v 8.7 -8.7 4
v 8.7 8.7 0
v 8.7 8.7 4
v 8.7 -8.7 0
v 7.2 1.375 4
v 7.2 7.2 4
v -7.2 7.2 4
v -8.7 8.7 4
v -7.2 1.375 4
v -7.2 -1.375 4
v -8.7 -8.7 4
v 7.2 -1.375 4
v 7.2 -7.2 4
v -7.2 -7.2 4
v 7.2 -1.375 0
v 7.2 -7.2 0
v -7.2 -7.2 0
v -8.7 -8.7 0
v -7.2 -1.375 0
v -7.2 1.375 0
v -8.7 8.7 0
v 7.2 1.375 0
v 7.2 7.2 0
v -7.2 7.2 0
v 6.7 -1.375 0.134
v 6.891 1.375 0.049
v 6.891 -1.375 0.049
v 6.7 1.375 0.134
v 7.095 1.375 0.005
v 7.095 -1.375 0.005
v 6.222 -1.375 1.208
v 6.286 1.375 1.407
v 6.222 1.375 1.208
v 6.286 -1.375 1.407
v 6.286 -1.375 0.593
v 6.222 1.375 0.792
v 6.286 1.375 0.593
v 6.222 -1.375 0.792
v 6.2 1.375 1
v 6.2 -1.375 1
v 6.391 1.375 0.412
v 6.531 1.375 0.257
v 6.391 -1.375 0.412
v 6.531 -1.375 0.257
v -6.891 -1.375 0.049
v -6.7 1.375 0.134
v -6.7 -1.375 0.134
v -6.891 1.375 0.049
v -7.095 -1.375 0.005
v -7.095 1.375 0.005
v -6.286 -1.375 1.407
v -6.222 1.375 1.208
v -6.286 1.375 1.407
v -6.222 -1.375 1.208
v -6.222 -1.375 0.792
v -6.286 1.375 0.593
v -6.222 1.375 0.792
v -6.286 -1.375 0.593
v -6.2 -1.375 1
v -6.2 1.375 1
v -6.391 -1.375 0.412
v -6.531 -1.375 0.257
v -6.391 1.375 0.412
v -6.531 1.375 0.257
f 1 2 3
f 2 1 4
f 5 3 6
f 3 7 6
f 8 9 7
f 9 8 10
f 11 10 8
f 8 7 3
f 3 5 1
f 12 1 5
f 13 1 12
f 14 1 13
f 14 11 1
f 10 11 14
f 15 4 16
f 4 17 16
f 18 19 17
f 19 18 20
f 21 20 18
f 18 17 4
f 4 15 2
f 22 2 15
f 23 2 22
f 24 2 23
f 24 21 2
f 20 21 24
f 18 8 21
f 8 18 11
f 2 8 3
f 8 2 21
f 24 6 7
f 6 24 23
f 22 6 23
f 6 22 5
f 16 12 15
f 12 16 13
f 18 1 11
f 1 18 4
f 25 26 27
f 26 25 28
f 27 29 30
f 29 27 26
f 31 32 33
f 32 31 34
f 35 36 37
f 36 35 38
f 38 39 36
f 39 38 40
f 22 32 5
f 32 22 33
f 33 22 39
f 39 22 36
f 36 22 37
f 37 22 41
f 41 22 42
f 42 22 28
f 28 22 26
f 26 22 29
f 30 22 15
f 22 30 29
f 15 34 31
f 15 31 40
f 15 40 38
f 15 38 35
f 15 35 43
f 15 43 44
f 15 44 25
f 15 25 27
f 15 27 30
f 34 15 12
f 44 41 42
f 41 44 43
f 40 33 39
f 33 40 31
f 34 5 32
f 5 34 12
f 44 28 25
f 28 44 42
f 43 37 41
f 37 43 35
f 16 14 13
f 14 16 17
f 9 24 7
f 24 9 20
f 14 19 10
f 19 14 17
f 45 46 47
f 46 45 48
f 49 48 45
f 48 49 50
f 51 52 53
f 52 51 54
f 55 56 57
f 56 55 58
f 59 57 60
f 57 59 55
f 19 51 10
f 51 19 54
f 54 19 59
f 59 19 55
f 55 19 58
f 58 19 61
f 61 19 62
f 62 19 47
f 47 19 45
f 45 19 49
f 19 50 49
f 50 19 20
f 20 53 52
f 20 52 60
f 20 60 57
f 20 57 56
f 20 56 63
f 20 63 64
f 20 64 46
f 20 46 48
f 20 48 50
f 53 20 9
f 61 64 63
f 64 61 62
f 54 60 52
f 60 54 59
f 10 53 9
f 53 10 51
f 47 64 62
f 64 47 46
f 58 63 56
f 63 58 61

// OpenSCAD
union () {
  union () {
    translate ([0, 7.95, 2]) {
      cube ([17.4, 1.5, 4], center=true);
    }
    translate ([7.95, 0, 2]) {
      cube ([1.5, 17.4, 4], center=true);
    }
    hull () {
      translate ([7.95, 0, 2]) {
        cube ([1.5, 2.75, 4], center=true);
      }
      translate ([7.2, 0, 1]) {
        rotate (a=90.0, v=[1, 0, 0]) {
          cylinder ($fn=30, h=2.75, r=1, center=true);
        }
      }
    }
  }
  mirror ([0, 1, 0]) {
    mirror ([1, 0, 0]) {
      union () {
        translate ([0, 7.95, 2]) {
          cube ([17.4, 1.5, 4], center=true);
        }
        translate ([7.95, 0, 2]) {
          cube ([1.5, 17.4, 4], center=true);
        }
        hull () {
          translate ([7.95, 0, 2]) {
            cube ([1.5, 2.75, 4], center=true);
          }
          translate ([7.2, 0, 1]) {
            rotate (a=90.0, v=[1, 0, 0]) {
              cylinder ($fn=30, h=2.75, r=1, center=true);
            }
          }
        }
      }
    }
  }
}
